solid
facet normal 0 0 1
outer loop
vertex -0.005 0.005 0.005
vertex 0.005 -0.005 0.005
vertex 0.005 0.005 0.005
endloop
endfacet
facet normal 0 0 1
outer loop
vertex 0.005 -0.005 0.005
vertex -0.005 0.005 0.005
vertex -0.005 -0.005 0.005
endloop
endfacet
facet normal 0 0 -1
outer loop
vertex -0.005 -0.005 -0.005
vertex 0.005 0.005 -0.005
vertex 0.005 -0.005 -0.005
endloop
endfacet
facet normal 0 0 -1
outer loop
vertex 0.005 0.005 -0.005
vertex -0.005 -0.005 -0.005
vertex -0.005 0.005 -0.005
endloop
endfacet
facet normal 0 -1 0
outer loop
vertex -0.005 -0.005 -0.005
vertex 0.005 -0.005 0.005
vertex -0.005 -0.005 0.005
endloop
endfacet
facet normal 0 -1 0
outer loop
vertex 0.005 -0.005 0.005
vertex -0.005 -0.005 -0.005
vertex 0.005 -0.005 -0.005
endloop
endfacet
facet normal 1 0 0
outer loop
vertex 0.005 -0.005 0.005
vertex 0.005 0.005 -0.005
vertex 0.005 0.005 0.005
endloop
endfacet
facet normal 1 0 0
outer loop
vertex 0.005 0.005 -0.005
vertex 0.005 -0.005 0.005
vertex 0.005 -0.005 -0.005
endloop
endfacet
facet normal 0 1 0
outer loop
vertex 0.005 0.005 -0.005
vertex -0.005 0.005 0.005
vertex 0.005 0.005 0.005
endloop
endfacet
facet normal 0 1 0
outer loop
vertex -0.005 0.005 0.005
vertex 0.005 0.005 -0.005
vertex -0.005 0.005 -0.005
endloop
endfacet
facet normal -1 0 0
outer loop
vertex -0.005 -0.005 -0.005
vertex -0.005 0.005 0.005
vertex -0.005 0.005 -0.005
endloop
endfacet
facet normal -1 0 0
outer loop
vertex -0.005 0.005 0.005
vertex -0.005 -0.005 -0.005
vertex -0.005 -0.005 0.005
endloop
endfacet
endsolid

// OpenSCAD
/*
 * This file is part of PolySymmetrica, a Polyhedral Geometry Modelling System.
 * Copyright 2025-2026 Susan Witts
 * SPDX-License-Identifier: MIT
 */

use <../../polysymmetrica/core/funcs.scad>
use <../../polysymmetrica/core/vertex.scad>
use <../../polysymmetrica/models/platonics_all.scad>

EPS = 1e-7;

module assert_int_eq(a, b, msg="") {
    assert(a == b, str(msg, " expected=", b, " got=", a));
}

function _irregular_valence4_bipyramid() =
    poly_make(
        [
            [0, 0, 1.7],
            [1.4, 0, 0],
            [0.2, 1.1, 0.35],
            [-1.0, 0.1, -0.15],
            [-0.1, -1.4, 0.25],
            [0.1, 0, -1.2]
        ],
        [
            [0, 2, 1],
            [0, 3, 2],
            [0, 4, 3],
            [0, 1, 4],
            [5, 1, 2],
            [5, 2, 3],
            [5, 3, 4],
            [5, 4, 1]
        ],
        1
    );

function _idx_loop(n) =
    [for (i = [0:1:n-1]) i];

function _points_max_diff(a, b) =
    max([for (i = [0:1:len(a)-1]) norm(a[i] - b[i])]);

function _ray_lambda(vertex_pt, neighbor_pt, p) =
    let(dir = neighbor_pt - vertex_pt)
    v_dot(p - vertex_pt, dir) / v_dot(dir, dir);

module test_ps_vertex_figure_cap_modes__recognizes_supported_modes() {
    modes = ps_vertex_figure_cap_modes();

    assert_int_eq(len(modes), 4, "cap mode count");
    assert(ps_vertex_figure_cap_mode_is_valid("planar_edge_fraction"), "planar_edge_fraction should be valid");
    assert(ps_vertex_figure_cap_mode_is_valid("edge_fraction"), "edge_fraction should be valid");
    assert(ps_vertex_figure_cap_mode_is_valid("centric"), "centric should be valid");
    assert(ps_vertex_figure_cap_mode_is_valid("poly_centroidal"), "poly_centroidal should be valid");
    assert(!ps_vertex_figure_cap_mode_is_valid("bogus"), "bogus cap mode should be rejected");
}

module test_ps_vertex_figure_points__edge_fraction_matches_raw_edge_points() {
    p = tetrahedron();
    verts = poly_verts(p);
    vi = 0;
    t = 0.25;
    fig = ps_vertex_figure(p, vi);
    neighbors = ps_vertex_figure_neighbors_idx(fig);
    expected = [for (ni = neighbors) verts[vi] + t * (verts[ni] - verts[vi])];
    pts = ps_vertex_figure_points(p, vi, t = t, cap_mode = "edge_fraction");

    assert(_points_max_diff(pts, expected) <= EPS, str("edge_fraction points should match raw edge points pts=", pts, " expected=", expected));
}

module test_ps_vertex_figure_points__planar_modes_planarize_irregular_valence4() {
    p = _irregular_valence4_bipyramid();
    modes = ["planar_edge_fraction", "centric", "poly_centroidal"];

    for (mode = modes) {
        pts = ps_vertex_figure_points(p, 0, t = 0.22, cap_mode = mode);
        err = _ps_face_planarity_err(pts, _idx_loop(len(pts)));
        assert(err <= EPS, str(mode, " should produce planar cap points err=", err, " pts=", pts));
    }
}

module test_ps_vertex_figure_points__edge_fraction_preserves_skew_irregular_valence4() {
    p = _irregular_valence4_bipyramid();
    pts = ps_vertex_figure_points(p, 0, t = 0.22, cap_mode = "edge_fraction");
    err = _ps_face_planarity_err(pts, _idx_loop(len(pts)));

    assert(err > 1e-3, str("edge_fraction should preserve non-planar raw cap err=", err, " pts=", pts));
}

module test_ps_vertex_figure_points__anti_trunc_points_are_on_opposite_rays() {
    p = _irregular_valence4_bipyramid();
    verts = poly_verts(p);
    vi = 0;
    fig = ps_vertex_figure(p, vi);
    neighbors = ps_vertex_figure_neighbors_idx(fig);
    pts = ps_vertex_figure_points(p, vi, t = -0.3, cap_mode = "planar_edge_fraction");
    lambdas = [
        for (i = [0:1:len(pts)-1])
            _ray_lambda(verts[vi], verts[neighbors[i]], pts[i])
    ];

    assert(max(lambdas) < 0, str("anti-trunc points should lie opposite incident neighbor rays lambdas=", lambdas));
}

module test_ps_vertex_figure_points__local_matches_neighbor_helper() {
    neighbor_pts = [[1, 0, 0], [0.1, 1, 0.3], [-1, 0.2, -0.1], [0, -1, 0.2]];
    poly_center_local = [0.2, 0.1, -1.4];
    pts1 = ps_vertex_figure_points_local(
        neighbor_pts,
        t = 0.22,
        cap_mode = "centric",
        poly_center_local = poly_center_local
    );
    pts2 = ps_vertex_figure_points_from_neighbors(
        [0, 0, 0],
        neighbor_pts,
        t = 0.22,
        cap_mode = "centric",
        poly_center = poly_center_local
    );

    assert(_points_max_diff(pts1, pts2) <= EPS, str("local helper should match neighbor helper pts1=", pts1, " pts2=", pts2));
}

module run_TestVertex() {
    test_ps_vertex_figure_cap_modes__recognizes_supported_modes();
    test_ps_vertex_figure_points__edge_fraction_matches_raw_edge_points();
    test_ps_vertex_figure_points__planar_modes_planarize_irregular_valence4();
    test_ps_vertex_figure_points__edge_fraction_preserves_skew_irregular_valence4();
    test_ps_vertex_figure_points__anti_trunc_points_are_on_opposite_rays();
    test_ps_vertex_figure_points__local_matches_neighbor_helper();
}

run_TestVertex();

cube([0.01, 0.01, 0.01], center = true);
